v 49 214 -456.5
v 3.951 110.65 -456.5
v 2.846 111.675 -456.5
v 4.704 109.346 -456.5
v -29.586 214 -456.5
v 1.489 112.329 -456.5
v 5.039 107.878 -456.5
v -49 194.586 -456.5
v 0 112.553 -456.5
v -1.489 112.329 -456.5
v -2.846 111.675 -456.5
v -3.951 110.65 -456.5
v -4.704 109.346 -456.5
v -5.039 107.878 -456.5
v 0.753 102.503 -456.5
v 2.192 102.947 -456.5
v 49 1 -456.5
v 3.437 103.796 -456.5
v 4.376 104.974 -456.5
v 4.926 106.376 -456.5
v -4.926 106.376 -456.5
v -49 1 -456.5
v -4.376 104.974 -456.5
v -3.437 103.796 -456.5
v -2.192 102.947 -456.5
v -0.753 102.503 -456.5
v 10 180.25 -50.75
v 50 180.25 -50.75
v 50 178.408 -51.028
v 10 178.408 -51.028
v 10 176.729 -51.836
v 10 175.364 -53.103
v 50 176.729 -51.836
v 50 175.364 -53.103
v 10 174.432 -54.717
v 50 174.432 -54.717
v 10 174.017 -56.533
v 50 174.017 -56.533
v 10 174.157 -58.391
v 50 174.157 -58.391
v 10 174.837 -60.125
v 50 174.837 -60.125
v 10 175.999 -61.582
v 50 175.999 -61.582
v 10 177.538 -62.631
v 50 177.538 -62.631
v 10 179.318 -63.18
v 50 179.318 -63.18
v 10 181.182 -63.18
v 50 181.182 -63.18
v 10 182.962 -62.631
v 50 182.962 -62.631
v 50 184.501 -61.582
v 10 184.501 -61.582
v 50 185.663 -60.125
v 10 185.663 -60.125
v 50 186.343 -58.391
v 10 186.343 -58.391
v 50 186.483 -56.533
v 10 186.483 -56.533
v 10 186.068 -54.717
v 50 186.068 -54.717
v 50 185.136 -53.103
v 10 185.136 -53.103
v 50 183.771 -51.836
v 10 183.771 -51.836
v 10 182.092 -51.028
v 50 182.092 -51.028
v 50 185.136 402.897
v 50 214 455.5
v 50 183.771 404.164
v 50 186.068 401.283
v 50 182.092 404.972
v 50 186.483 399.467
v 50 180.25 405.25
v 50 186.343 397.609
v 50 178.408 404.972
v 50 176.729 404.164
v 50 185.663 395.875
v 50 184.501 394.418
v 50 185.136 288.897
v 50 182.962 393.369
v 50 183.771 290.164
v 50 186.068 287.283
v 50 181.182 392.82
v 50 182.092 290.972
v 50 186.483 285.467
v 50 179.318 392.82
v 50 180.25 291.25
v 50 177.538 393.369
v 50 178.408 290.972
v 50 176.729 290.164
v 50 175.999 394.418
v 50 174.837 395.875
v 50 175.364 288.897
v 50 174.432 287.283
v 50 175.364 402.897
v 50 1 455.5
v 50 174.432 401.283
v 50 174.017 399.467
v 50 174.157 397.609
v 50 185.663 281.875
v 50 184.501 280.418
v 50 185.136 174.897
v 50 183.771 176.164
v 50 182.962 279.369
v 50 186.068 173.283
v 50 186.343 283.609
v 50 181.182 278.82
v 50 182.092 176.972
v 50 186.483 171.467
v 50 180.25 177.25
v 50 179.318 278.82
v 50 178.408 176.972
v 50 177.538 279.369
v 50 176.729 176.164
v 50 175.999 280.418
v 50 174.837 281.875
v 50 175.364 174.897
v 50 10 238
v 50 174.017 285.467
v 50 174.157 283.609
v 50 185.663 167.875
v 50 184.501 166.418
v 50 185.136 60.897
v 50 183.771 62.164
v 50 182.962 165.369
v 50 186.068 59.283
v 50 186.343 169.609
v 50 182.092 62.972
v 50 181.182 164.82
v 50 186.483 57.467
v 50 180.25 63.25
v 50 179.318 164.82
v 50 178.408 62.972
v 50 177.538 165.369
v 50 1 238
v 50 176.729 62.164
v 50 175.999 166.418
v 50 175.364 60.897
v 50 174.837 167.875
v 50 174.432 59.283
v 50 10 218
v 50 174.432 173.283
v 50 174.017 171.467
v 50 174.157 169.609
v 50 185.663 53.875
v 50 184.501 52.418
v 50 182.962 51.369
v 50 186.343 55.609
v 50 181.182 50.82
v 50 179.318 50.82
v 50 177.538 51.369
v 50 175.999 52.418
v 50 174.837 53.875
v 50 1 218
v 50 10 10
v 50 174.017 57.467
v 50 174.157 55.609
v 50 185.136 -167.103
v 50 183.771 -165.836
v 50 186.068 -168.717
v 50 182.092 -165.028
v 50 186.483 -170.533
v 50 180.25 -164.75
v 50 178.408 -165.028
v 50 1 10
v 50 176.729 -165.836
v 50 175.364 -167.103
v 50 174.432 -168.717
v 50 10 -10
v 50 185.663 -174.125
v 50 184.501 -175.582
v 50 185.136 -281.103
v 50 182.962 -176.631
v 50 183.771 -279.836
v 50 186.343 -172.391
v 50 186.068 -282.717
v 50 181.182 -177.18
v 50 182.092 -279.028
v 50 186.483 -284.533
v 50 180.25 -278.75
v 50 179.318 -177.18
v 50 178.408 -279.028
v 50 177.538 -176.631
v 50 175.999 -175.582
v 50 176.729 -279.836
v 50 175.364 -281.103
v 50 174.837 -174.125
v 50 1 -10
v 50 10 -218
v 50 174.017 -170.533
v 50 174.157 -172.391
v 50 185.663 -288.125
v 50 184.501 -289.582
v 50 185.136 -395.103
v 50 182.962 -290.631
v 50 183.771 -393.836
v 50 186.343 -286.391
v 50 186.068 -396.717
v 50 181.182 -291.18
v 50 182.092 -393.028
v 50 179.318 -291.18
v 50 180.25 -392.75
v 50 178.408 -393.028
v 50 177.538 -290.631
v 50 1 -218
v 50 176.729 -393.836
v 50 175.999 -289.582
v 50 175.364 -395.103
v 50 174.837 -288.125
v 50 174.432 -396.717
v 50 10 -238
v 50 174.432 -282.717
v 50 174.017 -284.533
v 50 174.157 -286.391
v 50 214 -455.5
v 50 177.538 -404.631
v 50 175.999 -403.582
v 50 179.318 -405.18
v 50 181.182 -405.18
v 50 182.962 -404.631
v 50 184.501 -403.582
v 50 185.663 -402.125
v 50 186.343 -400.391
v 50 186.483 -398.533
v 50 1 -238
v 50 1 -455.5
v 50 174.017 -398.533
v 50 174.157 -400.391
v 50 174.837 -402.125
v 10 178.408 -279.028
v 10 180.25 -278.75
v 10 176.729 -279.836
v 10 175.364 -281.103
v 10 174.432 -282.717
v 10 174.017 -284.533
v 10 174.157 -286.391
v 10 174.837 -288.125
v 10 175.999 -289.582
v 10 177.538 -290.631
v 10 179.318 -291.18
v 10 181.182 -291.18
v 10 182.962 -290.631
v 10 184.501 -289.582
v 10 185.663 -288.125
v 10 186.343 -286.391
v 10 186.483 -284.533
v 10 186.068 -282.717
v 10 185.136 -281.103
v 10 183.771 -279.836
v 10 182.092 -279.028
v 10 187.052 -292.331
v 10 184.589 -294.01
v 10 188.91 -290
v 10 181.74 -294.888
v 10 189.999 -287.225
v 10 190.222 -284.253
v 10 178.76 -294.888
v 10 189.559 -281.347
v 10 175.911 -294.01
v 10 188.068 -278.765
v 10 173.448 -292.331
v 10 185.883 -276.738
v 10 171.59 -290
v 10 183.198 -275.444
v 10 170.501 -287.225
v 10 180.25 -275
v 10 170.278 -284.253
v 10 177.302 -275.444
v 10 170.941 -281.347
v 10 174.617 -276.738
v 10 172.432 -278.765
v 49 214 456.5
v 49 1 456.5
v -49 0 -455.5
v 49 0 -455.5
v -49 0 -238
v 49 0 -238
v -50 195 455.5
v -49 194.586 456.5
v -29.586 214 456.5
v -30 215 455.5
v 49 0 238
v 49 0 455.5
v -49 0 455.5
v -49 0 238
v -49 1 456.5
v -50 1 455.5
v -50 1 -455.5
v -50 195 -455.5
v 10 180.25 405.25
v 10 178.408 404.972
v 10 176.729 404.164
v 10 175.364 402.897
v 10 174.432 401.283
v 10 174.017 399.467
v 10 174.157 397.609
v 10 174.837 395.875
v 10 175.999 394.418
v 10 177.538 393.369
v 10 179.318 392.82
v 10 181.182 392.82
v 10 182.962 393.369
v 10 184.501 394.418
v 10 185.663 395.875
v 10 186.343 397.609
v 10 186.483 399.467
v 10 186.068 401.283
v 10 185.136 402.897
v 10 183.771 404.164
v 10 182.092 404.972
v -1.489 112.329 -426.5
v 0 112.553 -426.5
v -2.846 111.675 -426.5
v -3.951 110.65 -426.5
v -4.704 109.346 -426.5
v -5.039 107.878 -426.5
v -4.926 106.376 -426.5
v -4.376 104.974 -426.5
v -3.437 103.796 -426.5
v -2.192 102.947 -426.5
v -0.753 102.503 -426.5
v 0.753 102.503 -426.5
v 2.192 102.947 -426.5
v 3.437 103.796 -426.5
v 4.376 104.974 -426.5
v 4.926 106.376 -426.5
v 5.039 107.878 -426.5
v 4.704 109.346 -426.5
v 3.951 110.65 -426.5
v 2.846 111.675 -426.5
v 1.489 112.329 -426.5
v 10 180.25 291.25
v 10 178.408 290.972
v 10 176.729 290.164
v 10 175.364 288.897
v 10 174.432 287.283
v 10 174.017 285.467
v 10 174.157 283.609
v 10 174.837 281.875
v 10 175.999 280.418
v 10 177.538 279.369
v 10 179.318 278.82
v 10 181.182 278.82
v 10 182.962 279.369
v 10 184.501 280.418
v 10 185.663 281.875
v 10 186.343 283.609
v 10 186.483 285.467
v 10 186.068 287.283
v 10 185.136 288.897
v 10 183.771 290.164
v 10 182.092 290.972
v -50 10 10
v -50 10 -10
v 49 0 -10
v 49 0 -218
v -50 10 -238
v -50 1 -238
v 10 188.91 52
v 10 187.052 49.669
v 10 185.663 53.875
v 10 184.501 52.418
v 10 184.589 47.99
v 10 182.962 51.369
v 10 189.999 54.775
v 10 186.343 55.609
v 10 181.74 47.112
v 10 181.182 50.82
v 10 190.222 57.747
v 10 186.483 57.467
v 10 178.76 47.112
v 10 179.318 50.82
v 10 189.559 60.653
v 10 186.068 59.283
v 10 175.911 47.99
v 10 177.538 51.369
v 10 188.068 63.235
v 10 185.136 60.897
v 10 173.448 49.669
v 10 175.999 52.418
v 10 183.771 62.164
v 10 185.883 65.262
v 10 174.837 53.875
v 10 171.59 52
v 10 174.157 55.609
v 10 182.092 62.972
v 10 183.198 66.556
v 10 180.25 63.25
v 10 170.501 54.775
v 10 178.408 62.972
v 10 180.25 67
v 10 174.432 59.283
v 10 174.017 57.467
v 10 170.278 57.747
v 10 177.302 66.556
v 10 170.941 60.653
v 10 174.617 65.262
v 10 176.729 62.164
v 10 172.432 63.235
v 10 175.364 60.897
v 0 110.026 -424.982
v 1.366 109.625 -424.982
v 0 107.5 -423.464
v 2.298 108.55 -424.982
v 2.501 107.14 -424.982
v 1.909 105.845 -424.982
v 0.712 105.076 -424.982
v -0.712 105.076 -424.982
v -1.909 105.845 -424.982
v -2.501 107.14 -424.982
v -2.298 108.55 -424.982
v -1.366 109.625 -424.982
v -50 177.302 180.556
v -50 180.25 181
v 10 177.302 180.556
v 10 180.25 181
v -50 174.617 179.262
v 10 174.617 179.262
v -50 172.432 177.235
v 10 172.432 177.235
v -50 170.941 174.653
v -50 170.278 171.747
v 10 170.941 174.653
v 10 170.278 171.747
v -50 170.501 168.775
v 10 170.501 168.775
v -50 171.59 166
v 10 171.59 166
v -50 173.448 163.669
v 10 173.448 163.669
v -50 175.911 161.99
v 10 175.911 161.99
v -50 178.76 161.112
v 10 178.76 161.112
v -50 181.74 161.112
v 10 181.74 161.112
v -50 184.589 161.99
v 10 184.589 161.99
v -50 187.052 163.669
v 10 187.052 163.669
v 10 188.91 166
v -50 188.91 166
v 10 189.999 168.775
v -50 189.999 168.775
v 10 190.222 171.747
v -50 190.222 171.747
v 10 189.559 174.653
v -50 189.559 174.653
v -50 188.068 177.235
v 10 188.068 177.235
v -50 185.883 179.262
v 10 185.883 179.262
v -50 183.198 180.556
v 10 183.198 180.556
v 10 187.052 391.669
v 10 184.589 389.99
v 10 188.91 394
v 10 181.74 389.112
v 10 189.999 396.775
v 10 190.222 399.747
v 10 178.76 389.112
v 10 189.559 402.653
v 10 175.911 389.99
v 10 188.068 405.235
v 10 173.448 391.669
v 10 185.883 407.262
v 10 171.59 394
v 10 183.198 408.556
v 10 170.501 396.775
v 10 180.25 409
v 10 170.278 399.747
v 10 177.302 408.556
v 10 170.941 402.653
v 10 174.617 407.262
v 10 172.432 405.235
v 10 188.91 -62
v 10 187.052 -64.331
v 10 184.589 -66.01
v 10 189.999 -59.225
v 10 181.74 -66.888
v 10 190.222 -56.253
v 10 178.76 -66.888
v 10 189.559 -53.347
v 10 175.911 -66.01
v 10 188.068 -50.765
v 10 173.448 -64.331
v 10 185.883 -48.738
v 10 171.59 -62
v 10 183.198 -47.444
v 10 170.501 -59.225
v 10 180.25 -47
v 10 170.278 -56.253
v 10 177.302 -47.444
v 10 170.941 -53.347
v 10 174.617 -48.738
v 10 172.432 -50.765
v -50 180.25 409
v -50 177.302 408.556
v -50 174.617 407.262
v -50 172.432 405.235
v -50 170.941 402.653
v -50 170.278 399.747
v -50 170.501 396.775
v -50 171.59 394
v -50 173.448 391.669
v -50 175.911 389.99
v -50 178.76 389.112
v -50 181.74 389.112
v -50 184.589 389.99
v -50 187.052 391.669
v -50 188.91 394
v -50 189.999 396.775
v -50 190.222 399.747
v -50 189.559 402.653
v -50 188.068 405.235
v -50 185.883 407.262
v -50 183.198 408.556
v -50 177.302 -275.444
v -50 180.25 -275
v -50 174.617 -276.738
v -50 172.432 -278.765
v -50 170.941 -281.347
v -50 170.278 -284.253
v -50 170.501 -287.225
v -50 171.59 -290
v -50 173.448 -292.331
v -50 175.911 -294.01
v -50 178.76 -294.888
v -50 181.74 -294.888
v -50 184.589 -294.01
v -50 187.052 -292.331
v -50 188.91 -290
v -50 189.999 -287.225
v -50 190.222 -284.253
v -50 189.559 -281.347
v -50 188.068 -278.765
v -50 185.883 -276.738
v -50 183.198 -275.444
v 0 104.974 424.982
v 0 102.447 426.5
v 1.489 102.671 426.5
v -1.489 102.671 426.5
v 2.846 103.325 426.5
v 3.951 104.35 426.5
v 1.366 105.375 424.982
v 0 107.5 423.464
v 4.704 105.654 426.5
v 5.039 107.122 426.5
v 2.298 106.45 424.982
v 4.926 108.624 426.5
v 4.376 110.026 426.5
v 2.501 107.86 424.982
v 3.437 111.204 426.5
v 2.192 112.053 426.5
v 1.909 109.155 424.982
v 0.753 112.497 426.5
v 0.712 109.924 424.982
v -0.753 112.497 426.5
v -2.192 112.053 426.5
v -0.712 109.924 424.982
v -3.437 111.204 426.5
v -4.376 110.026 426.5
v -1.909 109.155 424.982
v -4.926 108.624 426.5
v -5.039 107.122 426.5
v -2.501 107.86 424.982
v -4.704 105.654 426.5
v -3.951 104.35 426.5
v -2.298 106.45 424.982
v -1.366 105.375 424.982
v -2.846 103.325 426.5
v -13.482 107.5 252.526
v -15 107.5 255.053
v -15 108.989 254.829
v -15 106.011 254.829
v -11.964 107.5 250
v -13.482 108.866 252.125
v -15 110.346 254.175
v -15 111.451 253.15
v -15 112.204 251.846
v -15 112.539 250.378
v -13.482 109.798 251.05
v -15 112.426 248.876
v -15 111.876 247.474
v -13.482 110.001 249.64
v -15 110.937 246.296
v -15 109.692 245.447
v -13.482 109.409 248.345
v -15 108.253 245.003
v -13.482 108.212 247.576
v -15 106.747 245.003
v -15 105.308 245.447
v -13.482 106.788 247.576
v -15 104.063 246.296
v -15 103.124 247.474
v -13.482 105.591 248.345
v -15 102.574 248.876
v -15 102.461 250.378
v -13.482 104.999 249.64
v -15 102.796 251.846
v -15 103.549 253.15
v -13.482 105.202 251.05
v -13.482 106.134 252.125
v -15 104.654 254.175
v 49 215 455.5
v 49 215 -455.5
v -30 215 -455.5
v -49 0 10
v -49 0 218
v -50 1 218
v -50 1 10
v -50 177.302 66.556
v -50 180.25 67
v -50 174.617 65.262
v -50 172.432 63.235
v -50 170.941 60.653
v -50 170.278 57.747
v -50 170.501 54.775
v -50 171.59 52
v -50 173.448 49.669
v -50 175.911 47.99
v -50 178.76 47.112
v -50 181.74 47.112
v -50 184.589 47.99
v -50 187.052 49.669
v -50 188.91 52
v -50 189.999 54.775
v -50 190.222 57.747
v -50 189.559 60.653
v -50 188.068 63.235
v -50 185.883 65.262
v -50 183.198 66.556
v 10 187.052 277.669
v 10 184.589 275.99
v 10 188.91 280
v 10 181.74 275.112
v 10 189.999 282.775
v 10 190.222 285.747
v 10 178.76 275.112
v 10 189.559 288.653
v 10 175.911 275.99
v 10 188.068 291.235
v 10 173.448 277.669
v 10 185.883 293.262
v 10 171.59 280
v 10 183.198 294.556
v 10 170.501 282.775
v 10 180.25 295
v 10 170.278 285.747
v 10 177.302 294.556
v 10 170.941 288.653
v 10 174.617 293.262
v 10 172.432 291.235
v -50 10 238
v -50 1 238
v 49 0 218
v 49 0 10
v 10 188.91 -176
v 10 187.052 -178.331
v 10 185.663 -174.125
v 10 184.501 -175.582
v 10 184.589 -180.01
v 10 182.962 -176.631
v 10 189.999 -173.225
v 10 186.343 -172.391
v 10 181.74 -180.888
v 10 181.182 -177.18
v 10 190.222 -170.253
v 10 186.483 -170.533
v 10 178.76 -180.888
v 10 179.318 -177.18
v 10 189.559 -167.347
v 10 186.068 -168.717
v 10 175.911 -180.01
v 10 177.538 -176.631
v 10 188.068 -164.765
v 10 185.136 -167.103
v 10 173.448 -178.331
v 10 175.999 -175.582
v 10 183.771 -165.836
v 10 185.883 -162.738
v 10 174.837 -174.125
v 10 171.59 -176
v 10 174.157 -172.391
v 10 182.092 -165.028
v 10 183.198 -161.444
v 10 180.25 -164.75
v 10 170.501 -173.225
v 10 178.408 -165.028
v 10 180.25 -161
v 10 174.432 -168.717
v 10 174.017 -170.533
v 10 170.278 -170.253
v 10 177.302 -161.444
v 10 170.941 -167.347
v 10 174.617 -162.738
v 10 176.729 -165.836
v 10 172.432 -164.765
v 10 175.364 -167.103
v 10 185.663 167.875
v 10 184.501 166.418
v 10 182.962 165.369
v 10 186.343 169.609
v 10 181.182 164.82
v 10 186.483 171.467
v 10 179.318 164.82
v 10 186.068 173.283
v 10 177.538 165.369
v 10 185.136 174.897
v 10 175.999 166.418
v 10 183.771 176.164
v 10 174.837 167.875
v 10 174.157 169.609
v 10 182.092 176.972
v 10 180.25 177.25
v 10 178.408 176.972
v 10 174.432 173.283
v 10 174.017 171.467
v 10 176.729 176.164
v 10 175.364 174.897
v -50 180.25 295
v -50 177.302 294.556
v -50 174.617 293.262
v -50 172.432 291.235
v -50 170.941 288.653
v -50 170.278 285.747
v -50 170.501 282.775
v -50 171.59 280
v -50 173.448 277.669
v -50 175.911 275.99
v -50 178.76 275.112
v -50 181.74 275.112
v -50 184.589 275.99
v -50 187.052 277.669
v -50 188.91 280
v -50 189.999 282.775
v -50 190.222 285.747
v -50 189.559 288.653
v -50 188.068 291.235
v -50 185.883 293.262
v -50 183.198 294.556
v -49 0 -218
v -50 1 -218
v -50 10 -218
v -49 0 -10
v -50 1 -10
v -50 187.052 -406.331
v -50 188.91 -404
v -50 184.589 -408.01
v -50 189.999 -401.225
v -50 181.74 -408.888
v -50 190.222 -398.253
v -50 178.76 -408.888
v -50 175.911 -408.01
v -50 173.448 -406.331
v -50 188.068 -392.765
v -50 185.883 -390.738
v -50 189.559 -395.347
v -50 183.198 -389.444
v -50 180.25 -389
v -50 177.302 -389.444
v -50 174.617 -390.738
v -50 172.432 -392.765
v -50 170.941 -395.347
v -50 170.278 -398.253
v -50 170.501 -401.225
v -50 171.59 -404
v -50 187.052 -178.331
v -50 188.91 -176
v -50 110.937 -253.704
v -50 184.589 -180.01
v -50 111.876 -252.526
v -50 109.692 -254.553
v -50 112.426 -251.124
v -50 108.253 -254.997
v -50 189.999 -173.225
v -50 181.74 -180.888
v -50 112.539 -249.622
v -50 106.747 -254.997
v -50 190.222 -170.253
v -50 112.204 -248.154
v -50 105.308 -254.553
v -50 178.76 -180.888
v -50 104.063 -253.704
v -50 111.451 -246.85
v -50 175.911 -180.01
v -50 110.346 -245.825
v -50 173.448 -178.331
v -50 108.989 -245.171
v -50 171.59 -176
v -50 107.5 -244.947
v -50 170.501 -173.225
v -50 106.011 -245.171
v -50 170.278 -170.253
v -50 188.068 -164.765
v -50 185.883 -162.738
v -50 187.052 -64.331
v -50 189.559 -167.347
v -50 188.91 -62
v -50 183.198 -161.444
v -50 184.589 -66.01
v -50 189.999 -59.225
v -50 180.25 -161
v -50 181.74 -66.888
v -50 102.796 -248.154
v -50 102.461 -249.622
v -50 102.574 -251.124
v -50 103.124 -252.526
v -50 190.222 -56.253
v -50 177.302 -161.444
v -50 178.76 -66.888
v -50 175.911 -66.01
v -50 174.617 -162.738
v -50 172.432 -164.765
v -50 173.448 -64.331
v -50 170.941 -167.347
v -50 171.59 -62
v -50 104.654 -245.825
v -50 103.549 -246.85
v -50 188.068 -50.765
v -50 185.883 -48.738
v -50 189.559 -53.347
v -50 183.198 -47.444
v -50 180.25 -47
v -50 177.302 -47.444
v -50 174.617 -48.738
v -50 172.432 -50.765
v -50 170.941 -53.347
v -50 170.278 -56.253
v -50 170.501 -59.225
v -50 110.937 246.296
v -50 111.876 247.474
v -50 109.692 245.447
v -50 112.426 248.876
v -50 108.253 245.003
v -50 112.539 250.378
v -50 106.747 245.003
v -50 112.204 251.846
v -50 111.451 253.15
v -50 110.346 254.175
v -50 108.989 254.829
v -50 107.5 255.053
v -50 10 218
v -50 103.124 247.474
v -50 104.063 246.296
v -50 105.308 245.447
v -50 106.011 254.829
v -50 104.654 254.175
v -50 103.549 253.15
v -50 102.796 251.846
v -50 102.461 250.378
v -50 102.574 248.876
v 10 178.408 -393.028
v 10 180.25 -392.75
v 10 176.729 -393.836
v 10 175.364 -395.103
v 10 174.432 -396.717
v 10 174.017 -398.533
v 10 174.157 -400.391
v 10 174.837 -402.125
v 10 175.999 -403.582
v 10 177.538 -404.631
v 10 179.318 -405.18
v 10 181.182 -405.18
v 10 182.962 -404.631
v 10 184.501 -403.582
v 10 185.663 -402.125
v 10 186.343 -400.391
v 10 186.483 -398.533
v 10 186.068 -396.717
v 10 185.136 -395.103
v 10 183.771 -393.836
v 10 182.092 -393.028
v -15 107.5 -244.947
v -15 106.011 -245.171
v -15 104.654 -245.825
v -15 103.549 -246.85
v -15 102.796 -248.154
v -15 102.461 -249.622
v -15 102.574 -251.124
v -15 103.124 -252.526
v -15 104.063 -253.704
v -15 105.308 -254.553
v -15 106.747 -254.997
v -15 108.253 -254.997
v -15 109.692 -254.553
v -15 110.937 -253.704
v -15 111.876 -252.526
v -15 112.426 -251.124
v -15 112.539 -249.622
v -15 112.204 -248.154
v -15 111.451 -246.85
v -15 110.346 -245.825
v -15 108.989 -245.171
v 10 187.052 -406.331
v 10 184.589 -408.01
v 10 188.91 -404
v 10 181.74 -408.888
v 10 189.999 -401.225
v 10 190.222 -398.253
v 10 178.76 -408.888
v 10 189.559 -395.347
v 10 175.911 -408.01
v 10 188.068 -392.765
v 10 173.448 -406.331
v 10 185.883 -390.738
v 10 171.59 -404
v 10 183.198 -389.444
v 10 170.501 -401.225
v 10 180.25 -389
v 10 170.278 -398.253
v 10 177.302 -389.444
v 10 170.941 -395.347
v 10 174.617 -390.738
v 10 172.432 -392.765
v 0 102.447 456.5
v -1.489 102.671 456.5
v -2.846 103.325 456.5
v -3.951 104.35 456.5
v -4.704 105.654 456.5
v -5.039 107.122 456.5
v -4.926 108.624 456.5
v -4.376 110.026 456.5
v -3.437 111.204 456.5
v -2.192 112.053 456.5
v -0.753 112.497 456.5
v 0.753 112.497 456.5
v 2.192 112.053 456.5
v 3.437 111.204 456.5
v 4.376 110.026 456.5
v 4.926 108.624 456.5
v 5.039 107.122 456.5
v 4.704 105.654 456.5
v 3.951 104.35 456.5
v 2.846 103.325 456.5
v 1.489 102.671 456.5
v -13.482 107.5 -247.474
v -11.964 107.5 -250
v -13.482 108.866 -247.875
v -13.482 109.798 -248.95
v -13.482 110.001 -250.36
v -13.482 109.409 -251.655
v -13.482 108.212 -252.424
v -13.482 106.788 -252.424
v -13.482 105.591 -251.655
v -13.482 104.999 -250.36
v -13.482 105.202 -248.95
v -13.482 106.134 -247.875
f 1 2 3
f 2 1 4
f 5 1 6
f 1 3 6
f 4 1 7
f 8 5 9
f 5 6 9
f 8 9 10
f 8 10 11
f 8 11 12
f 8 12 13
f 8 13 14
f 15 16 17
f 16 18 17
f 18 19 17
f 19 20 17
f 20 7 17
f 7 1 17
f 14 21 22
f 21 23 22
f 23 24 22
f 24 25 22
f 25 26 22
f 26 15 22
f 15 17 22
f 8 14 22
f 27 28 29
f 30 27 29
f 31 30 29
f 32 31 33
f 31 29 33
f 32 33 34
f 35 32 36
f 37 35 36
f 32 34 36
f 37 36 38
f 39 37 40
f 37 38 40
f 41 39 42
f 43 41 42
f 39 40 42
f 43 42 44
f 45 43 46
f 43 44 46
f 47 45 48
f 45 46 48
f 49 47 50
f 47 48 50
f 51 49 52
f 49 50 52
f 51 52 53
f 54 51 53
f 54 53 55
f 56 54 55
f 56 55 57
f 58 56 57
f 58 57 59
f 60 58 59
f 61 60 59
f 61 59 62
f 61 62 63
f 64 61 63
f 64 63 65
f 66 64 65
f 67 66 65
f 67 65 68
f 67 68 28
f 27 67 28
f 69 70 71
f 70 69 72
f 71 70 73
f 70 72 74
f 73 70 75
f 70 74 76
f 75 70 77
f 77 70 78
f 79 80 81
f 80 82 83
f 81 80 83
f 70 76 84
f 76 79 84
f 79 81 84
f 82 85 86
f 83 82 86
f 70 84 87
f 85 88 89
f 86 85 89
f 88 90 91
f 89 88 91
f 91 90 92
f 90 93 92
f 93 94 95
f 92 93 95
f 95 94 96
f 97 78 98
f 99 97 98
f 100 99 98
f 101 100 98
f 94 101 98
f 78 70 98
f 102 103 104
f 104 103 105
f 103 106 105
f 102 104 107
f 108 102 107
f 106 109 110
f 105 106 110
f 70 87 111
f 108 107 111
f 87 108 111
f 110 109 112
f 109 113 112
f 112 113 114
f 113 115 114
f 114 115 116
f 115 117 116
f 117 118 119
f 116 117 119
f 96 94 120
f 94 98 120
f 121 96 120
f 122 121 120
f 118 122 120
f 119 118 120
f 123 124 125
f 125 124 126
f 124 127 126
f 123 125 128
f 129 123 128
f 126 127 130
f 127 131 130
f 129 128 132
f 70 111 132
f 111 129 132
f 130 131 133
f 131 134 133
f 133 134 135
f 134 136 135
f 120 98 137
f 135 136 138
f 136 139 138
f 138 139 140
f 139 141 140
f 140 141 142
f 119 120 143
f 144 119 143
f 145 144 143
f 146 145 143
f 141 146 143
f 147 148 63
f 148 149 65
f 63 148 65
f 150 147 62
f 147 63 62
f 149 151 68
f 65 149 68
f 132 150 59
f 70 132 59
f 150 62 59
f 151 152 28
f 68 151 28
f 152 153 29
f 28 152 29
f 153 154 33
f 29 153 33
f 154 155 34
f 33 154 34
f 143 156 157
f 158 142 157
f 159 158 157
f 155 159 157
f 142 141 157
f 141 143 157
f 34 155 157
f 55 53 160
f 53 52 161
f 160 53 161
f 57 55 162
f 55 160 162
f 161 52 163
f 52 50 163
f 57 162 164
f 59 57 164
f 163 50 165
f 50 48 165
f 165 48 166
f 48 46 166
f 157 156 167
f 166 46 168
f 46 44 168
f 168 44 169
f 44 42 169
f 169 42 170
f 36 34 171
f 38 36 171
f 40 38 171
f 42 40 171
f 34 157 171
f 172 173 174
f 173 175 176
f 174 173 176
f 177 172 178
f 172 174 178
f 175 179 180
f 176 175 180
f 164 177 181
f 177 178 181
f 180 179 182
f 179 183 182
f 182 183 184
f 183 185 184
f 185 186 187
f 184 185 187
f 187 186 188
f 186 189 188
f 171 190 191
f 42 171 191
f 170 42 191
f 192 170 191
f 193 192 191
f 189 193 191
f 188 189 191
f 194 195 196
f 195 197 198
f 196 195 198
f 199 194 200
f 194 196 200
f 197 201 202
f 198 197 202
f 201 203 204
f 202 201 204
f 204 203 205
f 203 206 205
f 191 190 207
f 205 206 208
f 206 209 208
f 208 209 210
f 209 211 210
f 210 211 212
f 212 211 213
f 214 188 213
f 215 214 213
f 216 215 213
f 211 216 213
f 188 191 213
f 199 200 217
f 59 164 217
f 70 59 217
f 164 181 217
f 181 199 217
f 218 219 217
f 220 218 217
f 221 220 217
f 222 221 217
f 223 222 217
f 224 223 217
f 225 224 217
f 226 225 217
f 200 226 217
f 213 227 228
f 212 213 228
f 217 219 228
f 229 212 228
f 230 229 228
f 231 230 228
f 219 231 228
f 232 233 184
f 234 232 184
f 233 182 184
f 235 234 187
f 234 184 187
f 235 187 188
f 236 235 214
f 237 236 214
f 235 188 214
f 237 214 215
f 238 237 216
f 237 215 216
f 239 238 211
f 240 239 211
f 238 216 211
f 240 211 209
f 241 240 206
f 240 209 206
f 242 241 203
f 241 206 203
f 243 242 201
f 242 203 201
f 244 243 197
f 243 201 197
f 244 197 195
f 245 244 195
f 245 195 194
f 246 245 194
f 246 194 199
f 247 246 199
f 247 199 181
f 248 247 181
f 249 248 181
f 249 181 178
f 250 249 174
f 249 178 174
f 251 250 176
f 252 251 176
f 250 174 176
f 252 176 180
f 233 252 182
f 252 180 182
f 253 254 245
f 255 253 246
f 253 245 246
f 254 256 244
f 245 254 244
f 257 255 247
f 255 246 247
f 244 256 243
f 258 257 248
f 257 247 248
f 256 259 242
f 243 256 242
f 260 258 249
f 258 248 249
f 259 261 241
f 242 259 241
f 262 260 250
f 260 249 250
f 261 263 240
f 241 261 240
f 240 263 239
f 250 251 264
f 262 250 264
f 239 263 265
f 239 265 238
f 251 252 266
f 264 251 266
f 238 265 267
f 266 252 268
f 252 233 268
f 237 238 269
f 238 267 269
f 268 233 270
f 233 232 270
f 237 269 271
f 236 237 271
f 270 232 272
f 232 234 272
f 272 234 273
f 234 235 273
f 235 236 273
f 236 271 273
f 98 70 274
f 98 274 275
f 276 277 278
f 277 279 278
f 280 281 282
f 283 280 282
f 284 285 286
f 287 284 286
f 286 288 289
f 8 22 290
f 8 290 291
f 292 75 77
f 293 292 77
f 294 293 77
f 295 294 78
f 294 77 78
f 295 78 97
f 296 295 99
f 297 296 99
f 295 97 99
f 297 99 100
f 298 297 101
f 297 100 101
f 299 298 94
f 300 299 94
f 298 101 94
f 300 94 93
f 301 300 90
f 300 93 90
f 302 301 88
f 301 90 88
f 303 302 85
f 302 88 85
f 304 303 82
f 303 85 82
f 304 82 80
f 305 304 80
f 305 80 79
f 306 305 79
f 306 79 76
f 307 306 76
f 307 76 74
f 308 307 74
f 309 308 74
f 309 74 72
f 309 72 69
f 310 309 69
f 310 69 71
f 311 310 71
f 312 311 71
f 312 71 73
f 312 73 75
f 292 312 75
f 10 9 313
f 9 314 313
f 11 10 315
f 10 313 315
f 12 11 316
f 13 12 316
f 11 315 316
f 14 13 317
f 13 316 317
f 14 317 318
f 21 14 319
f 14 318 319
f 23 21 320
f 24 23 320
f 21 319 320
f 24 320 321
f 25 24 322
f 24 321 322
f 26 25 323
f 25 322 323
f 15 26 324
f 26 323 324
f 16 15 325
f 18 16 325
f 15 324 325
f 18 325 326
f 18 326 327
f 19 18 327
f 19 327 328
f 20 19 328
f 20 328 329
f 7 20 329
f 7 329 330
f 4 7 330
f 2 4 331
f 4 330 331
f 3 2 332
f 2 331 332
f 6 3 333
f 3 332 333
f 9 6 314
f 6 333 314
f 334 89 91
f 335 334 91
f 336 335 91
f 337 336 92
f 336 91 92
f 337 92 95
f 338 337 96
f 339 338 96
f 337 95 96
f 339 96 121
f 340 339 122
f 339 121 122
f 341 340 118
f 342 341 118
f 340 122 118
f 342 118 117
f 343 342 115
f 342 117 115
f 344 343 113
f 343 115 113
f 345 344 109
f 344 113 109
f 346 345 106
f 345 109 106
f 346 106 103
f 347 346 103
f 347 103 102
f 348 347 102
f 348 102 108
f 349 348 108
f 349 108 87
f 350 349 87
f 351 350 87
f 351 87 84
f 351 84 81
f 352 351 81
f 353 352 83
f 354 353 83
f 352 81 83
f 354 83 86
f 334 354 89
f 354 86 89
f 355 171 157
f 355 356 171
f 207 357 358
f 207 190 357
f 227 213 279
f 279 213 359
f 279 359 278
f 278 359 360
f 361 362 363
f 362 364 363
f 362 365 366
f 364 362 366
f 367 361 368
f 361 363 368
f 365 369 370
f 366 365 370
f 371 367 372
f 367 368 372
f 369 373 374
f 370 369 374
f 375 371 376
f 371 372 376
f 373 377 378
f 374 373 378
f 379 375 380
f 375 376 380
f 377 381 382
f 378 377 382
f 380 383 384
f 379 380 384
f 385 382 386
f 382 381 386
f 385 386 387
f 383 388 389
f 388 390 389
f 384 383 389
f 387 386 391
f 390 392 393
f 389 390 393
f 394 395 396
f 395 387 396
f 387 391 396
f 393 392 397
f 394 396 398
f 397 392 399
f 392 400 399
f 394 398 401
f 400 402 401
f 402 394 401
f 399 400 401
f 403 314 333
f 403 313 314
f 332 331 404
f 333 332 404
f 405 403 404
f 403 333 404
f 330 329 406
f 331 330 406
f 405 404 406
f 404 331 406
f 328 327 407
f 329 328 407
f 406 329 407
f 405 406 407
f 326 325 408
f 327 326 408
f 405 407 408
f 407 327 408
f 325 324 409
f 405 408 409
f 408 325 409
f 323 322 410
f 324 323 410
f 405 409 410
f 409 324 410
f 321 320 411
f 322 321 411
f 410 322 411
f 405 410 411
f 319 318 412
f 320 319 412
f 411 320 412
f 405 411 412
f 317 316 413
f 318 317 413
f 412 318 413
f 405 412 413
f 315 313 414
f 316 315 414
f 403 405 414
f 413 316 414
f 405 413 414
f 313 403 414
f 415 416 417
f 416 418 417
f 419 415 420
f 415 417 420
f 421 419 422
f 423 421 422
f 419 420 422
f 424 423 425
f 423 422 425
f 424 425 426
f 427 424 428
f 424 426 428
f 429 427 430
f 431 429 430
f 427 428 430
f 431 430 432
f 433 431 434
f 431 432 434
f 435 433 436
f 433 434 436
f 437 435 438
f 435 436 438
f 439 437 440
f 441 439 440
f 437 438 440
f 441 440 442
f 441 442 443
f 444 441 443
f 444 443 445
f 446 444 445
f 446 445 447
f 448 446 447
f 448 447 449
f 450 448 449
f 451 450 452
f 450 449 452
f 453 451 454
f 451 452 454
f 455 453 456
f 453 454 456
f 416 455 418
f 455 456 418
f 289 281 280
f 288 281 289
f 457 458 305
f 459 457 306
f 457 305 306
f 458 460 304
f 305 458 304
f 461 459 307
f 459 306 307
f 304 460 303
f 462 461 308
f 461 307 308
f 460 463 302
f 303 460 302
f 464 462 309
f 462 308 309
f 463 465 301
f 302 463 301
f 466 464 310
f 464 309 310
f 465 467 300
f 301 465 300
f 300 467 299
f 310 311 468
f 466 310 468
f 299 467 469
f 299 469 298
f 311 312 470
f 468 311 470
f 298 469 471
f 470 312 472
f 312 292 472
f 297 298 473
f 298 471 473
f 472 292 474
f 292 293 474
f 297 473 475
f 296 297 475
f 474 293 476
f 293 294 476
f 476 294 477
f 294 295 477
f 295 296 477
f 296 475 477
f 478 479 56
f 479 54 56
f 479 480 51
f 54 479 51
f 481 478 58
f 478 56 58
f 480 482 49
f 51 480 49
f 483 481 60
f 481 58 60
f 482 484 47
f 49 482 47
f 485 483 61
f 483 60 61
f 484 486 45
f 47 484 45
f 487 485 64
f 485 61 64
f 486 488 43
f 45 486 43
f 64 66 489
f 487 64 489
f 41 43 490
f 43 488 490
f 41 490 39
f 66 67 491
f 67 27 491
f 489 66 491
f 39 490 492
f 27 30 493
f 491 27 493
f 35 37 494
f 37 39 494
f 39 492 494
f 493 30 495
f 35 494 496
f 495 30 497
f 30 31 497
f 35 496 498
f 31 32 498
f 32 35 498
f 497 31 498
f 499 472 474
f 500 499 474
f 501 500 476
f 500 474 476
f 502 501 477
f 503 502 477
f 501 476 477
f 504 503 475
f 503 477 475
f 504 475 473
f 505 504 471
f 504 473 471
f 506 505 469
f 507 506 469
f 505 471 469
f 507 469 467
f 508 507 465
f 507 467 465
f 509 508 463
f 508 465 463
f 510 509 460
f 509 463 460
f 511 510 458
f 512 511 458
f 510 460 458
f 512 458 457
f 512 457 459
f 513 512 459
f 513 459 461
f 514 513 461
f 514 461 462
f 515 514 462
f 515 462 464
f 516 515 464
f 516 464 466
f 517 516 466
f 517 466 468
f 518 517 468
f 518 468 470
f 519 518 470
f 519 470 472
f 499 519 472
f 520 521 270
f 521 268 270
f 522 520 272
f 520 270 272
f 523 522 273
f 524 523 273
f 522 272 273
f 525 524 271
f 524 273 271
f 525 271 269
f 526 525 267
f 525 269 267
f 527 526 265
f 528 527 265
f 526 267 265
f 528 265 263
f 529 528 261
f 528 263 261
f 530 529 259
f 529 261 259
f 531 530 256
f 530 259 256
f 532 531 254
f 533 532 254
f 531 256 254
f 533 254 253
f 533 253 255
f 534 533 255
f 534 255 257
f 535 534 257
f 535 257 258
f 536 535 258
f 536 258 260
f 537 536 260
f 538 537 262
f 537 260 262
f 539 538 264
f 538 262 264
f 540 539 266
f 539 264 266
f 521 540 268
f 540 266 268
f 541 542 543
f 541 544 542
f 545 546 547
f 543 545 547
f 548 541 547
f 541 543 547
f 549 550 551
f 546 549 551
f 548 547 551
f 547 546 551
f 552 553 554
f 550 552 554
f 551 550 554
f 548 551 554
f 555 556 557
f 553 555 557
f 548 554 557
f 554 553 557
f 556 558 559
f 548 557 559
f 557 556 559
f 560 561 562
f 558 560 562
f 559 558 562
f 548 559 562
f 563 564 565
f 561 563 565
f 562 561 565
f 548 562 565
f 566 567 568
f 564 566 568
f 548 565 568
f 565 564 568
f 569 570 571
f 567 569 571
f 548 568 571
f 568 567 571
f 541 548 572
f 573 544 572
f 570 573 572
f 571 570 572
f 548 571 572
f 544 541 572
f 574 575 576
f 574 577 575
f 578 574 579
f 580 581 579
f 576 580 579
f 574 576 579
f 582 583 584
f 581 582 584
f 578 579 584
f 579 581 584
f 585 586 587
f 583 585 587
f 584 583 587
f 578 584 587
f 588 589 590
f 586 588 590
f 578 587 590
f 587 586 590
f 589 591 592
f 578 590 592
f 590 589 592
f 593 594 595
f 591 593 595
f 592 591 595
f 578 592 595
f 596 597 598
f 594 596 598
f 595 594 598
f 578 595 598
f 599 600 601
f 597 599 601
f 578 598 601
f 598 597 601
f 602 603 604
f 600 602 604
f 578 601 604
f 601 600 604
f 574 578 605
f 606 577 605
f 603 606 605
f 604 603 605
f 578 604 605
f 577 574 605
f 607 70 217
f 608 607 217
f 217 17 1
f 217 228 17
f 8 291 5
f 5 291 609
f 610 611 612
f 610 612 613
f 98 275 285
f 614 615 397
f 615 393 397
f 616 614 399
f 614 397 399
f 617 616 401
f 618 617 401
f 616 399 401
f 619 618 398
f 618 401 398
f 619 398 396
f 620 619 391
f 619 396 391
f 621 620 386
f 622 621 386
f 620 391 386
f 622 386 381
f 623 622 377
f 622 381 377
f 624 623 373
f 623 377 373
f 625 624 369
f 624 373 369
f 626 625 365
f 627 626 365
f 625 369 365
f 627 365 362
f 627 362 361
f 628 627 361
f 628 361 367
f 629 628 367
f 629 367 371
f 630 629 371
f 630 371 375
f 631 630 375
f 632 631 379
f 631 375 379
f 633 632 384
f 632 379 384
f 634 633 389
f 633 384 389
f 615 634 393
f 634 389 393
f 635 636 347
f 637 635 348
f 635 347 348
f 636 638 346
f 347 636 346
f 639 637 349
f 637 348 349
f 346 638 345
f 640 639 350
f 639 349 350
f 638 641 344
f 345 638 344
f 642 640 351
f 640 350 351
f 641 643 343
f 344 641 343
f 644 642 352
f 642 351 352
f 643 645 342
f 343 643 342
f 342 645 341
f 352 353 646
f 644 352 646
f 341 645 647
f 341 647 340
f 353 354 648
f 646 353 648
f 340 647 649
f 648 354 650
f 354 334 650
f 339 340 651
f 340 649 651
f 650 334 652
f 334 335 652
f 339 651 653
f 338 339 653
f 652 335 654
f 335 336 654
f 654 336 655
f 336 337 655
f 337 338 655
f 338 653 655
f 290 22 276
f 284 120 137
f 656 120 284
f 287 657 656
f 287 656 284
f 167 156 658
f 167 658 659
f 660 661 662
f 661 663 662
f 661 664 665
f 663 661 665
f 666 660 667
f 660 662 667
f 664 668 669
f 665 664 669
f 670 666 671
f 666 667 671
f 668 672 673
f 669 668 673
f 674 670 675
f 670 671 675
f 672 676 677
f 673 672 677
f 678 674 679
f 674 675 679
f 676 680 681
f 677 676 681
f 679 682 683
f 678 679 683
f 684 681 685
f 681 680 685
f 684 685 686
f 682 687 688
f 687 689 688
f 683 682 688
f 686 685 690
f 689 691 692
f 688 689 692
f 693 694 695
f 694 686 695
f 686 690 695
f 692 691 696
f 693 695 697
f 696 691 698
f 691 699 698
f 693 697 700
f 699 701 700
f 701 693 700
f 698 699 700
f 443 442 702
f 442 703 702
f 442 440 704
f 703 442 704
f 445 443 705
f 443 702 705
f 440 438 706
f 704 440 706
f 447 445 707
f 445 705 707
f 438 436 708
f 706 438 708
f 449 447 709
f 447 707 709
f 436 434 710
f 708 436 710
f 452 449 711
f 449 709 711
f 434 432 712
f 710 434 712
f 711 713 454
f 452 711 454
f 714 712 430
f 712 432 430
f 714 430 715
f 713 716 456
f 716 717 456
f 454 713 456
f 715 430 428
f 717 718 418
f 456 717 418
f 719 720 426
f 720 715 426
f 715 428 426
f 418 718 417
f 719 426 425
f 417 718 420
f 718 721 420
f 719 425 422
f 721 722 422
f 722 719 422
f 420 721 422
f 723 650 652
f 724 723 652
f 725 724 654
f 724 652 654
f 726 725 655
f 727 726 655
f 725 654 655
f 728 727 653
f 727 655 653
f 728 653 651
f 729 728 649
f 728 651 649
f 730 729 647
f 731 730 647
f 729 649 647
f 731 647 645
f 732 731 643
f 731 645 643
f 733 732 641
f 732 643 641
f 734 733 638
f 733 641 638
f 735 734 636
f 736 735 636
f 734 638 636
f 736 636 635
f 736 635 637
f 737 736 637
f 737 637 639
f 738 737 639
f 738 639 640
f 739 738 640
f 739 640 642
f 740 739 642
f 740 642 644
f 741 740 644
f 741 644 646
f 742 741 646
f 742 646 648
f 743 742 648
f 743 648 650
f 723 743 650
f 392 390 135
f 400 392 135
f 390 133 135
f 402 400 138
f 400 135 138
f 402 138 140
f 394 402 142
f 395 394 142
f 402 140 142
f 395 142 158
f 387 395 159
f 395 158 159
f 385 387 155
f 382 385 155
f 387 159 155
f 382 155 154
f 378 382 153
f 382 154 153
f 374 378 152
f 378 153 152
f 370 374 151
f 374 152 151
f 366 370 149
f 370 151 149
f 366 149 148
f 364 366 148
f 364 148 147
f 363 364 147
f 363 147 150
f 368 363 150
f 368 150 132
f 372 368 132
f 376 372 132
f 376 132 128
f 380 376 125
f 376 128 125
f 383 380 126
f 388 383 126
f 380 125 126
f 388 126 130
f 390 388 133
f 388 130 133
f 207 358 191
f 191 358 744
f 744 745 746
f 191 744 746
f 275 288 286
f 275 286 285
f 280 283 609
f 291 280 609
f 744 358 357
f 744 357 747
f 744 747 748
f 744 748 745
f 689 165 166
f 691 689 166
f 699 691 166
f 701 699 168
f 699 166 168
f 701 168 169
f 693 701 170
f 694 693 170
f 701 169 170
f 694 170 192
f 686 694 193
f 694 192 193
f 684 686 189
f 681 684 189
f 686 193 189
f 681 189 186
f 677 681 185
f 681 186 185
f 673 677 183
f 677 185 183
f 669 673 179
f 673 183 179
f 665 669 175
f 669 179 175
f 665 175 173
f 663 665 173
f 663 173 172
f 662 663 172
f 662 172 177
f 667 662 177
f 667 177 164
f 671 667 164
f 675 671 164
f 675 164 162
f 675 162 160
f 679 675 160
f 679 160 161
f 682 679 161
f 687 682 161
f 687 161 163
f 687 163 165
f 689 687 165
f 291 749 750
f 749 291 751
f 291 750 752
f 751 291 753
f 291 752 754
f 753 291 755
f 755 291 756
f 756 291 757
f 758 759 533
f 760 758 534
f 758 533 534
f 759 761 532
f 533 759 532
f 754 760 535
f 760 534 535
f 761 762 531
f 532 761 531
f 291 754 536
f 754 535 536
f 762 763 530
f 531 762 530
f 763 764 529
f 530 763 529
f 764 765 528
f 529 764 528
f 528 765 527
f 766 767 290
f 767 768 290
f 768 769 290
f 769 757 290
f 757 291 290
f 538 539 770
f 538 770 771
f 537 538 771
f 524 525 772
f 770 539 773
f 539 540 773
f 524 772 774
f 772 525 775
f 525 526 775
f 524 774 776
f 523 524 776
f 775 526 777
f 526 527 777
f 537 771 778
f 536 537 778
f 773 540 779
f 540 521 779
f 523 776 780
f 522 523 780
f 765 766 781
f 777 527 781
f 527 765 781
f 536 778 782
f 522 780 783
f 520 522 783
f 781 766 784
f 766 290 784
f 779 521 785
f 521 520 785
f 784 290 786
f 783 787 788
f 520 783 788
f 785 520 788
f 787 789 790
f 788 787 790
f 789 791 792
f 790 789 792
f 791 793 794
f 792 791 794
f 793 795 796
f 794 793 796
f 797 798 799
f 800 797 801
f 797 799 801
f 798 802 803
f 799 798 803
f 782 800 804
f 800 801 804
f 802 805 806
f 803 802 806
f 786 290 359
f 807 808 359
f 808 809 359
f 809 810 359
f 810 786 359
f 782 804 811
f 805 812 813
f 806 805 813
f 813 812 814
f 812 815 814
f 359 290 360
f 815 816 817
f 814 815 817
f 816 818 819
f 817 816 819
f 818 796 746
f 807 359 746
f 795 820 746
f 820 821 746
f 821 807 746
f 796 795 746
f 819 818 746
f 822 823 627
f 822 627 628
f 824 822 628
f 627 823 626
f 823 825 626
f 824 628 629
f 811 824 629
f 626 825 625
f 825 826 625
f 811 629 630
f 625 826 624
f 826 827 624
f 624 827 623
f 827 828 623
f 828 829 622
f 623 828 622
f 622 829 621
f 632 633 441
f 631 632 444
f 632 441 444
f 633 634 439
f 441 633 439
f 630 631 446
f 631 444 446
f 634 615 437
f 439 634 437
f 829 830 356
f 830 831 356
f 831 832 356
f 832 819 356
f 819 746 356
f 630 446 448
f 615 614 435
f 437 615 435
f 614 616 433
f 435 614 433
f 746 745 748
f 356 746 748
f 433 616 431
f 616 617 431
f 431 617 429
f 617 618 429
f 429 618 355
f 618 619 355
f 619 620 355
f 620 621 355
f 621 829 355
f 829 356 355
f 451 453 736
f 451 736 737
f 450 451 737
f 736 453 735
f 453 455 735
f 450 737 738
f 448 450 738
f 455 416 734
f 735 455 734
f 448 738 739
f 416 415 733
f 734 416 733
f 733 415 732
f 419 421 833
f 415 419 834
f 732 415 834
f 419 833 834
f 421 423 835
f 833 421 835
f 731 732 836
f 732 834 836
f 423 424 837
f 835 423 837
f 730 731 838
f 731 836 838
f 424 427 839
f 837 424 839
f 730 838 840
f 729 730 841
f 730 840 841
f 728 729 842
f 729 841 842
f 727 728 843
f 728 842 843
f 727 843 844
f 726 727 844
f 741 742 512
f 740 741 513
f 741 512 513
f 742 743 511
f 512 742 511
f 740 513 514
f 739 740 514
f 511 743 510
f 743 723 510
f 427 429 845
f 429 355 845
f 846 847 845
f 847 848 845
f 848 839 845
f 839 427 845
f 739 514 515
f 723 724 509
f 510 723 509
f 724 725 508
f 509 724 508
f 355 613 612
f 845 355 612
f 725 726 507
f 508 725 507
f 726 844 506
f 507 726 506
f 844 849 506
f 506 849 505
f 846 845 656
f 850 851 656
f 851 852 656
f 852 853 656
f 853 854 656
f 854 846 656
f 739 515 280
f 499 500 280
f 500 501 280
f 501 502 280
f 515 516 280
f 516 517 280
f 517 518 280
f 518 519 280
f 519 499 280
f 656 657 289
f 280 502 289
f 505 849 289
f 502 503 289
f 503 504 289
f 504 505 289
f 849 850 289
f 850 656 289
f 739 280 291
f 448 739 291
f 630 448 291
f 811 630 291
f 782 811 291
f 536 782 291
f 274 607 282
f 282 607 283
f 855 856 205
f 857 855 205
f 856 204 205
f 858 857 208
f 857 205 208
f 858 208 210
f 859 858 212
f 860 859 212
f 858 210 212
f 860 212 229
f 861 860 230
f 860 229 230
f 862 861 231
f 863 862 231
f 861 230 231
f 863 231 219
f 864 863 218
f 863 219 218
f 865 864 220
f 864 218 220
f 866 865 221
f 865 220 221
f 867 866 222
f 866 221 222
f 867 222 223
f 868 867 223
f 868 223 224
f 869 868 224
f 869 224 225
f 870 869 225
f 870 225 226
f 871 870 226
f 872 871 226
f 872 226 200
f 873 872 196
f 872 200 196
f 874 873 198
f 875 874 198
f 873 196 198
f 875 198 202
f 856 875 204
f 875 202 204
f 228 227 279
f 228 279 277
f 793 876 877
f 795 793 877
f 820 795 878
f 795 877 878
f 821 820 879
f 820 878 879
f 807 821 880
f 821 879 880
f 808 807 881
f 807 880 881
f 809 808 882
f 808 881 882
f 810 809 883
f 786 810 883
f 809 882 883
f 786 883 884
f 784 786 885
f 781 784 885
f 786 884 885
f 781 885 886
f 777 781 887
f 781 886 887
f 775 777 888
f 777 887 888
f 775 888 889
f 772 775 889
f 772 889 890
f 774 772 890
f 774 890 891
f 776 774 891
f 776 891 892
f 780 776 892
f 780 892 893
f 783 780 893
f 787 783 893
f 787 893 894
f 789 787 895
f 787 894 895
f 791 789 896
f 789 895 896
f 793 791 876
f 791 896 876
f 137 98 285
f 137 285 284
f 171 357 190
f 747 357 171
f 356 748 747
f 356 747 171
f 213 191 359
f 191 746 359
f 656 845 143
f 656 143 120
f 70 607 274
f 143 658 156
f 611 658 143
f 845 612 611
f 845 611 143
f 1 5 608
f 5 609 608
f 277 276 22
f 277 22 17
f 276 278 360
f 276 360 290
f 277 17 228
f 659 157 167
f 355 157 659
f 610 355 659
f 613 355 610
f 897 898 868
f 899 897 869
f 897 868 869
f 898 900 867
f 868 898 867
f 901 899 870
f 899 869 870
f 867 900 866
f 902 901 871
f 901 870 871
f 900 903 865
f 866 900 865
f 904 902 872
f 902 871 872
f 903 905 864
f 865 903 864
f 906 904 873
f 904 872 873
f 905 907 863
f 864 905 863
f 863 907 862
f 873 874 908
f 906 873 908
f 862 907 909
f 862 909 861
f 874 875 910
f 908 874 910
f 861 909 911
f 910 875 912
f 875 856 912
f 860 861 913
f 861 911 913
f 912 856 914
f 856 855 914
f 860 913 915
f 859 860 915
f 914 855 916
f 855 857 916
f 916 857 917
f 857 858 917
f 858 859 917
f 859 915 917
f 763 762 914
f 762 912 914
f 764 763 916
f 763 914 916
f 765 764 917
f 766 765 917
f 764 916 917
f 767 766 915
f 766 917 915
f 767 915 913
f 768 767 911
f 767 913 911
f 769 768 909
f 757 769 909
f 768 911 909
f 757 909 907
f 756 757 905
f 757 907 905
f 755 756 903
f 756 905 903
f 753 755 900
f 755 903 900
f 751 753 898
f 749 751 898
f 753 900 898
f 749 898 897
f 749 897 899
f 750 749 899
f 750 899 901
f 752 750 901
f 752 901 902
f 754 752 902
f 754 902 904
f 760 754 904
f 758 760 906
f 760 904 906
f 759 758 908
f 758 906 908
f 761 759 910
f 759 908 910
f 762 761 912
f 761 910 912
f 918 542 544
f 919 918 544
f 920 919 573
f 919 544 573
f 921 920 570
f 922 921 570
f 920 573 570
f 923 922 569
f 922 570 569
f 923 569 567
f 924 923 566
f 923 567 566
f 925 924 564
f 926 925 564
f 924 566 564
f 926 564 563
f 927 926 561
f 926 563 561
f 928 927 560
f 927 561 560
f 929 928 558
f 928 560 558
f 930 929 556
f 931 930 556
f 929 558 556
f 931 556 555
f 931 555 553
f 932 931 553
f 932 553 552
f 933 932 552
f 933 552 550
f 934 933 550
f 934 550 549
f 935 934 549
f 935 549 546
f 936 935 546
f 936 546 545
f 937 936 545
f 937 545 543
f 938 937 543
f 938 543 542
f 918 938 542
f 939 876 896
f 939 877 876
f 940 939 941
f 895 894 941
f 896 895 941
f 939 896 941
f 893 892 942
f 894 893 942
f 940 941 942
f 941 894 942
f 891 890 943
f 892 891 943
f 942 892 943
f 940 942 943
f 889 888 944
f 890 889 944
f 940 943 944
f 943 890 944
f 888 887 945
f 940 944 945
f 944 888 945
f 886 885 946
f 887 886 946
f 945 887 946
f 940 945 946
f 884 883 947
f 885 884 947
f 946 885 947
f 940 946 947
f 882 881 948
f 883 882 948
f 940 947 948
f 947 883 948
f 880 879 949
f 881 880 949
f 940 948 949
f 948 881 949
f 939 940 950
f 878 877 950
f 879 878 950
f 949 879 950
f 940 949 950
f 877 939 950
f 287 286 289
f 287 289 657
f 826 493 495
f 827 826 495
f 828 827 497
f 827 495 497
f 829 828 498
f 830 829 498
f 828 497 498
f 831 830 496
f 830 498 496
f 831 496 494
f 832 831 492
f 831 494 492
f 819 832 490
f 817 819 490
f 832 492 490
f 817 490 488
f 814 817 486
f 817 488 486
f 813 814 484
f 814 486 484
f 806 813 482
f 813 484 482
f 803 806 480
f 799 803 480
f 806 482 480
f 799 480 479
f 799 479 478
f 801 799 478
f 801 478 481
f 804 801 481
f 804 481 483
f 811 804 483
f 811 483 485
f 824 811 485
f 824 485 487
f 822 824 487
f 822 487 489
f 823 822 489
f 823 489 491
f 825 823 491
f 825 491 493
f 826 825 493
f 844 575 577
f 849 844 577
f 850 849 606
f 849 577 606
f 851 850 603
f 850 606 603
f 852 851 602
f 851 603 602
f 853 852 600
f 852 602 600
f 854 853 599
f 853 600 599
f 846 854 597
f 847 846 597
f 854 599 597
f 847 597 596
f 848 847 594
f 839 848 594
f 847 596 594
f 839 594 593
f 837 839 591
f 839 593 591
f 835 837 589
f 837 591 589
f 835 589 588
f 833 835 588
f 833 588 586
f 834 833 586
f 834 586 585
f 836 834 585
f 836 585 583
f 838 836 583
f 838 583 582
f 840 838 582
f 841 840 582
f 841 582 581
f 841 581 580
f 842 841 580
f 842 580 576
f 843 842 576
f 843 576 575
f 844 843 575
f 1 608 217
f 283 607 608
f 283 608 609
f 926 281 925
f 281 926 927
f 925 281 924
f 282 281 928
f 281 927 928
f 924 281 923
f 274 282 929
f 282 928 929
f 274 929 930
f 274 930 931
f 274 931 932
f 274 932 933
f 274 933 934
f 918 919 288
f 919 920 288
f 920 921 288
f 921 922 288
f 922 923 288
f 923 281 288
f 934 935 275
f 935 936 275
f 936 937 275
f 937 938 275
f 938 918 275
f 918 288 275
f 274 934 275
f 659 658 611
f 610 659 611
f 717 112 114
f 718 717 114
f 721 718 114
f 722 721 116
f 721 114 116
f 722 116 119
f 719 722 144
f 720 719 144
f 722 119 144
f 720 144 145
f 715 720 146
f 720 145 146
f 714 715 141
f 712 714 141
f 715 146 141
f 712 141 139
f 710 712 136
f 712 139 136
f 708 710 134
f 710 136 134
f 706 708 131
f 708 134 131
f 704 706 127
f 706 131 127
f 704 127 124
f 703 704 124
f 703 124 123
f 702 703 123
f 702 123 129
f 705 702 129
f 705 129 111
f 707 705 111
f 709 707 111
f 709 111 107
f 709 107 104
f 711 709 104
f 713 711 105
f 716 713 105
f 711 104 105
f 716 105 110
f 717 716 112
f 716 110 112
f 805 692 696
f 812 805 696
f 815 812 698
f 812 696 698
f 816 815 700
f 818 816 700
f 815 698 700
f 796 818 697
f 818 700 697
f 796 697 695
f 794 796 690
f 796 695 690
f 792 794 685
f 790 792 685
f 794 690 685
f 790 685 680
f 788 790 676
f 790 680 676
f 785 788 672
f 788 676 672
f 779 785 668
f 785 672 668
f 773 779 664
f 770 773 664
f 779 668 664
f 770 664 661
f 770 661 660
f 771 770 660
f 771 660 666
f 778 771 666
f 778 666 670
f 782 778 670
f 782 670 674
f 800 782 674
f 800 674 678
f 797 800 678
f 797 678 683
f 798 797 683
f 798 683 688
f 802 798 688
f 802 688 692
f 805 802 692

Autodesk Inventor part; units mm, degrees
ref_plane "YZ Plane" through (0, 0, 0) normal (1, 0, 0) x (0, 1, 0)
ref_plane "XZ Plane" through (0, 0, 0) normal (0, 1, 0) x (-1, 0, 0)
ref_plane "XY Plane" through (0, 0, 0) normal (0, 0, 1) x (1, 0, 0)
sketch "Sketch5" plane through (0, 0, 0) normal (0, 1, 0) x (-1, 0, 0)
  line L0 (50, 456.5) -> (-50, 456.5)
  line L1 (-50, 456.5) -> (-50, -456.5)
  line L2 (-50, -456.5) -> (50, -456.5)
  line L3 (50, -456.5) -> (50, 456.5)
  point P0 (0, 0)
  point P1 (50, 0)
  point P2 (0, 456.5)
  dimension "d8" = 100
  dimension "d9" = 913
extrude "Extrusion5" add sketch "Sketch5" along normal blind 215
sketch "Sketch7" plane through (-50, 0, -456.5) normal (-1, 0, 0) x (0, 0, 1)
  line L0 (0, 215) -> (913, 215) projected
  circle A0 centre (855.5, 180.25) radius 5.8396
  circle A1 centre (741.5, 180.25) radius 5.8396
  circle A2 centre (627.5, 180.25) radius 5.8396
  circle A3 centre (513.5, 180.25) radius 5.8396
  line L1 (456.5, 215) -> (456.5, 169.0746) construction
  circle A4 centre (57.5, 180.25) radius 5.8396
  circle A5 centre (171.5, 180.25) radius 5.8396
  circle A6 centre (285.5, 180.25) radius 5.8396
  circle A7 centre (399.5, 180.25) radius 5.8396
  line L2 (913, 0) -> (913, 215) projected
  point P0 (456.5, 0)
  point P1 (456.5, 0)
  dimension "d21" = 114
  dimension "d22" = 114
  dimension "d23" = 114
  dimension "d24" = 57
  dimension "d25" = 34.75
  dimension "d37" = 57.5
hole "Hole1" at (-50, 180.25, 399) at (-50, 180.25, 285) at (-50, 180.25, 171) at (-50, 180.25, 57) at (-50, 180.25, -57) at (-50, 180.25, -171) at (-50, 180.25, -285) at (-50, 180.25, -399) direction (1, 0, 0) diameter 12.5 end through all counterbore diameter 20 counterbore depth 60 clearance for "Socket Head Cap Screw DIN EN ISO 4762" size "M12" standard "DIN"
chamfer "Chamfer3" distance 20 angle 45 1 edges at (-50, 215, 0)
sketch "Sketch9" plane through (-50, 0, 456.5) normal (0, 0, 1) x (1, 0, 0)
  line L0 (0, 0) -> (100, 0) projected
  line L1 (100, 0) -> (100, 215) projected
  circle A0 centre (50, 107.5) radius 6
  point P0 (50, 0)
  point P1 (50, 0)
  point P2 (100, 107.5)
  dimension "d38" = 12
hole "Hole2" at (0, 107.5, 456.5) direction (0, 0, -1) diameter 10.106 depth 30 tip angle 118 thread size "M12x1.75" class "6H" standard "ANSI Metric M Profile"
sketch "Sketch10" plane through (50, 0, -456.5) normal (0, 0, -1) x (-1, 0, 0)
  line L0 (0, 0) -> (0, 215) projected
  line L1 (0, 0) -> (100, 0) projected
  circle A0 centre (50, 107.5) radius 6
  point P0 (50, 0)
  point P1 (0, 107.5)
  point P2 (50, 0)
  dimension "d46" = 12
hole "Hole3" at (0, 107.5, -456.5) direction (0, 0, 1) diameter 10.106 depth 30 tip angle 118 thread size "M12x1.75" class "6H" standard "ANSI Metric M Profile"
chamfer "Chamfer4" distance 1 angle 45 13 edges at (50, 215, 0) (10, 215, -456.5) (50, 107.5, -456.5) (-50, 97.5, -456.5) (0, 0, -456.5) (10, 215, 456.5) (-40, 205, 456.5) (-50, 97.5, 456.5) (50, 107.5, 456.5) (0, 0, 456.5) (50, 0, 0) (-50, 0, 0) (-40, 205, -456.5)
sketch "Sketch11" plane through (-50, 1, 455.5) normal (-1, 0, 0) x (0, 0, 1)
  line L0 (-217.5, -1) -> (-237.5, -1)
  line L1 (-237.5, -1) -> (-237.5, 9)
  line L2 (-237.5, 9) -> (-217.5, 9)
  line L3 (-217.5, 9) -> (-217.5, -1)
  line L4 (-445.5, -1) -> (-465.5, -1)
  line L5 (-465.5, -1) -> (-465.5, 9)
  line L6 (-465.5, 9) -> (-445.5, 9)
  line L7 (-445.5, 9) -> (-445.5, -1)
  line L8 (-911, -1) -> (0, -1) projected
  line L9 (-227.5, 9) -> (-227.5, 5.4206) construction
  line L10 (-455.5, -1) -> (-455.5, -35.8599) construction
  line L11 (-693.5, -1) -> (-673.5, -1)
  line L12 (-673.5, -1) -> (-673.5, 9)
  line L13 (-673.5, 9) -> (-693.5, 9)
  line L14 (-693.5, 9) -> (-693.5, -1)
  line L15 (-683.5, 9) -> (-683.5, 5.4206) construction
  point P0 (-455.5, 9)
  dimension "d57" = 20
  dimension "d58" = 10
  dimension "d59" = 10
  dimension "d60" = 20
  dimension "d61" = 228
extrude "Extrusion7" cut sketch "Sketch11" against normal through all
sketch "Sketch12" plane through (-50, 1, 455.5) normal (-1, 0, 0) x (0, 0, 1)
  circle A0 centre (-205.5, 106.5) radius 6
  circle A1 centre (-705.5, 106.5) radius 6
  line L0 (0, 214) -> (-911, 214) projected
  line L1 (-217.5, -1) -> (0, -1) projected
  point P0 (-455.5, -1)
  dimension "d64" = 215
  dimension "d65" = 107.5
  dimension "d66" = 500
  dimension "d67" = 911
  dimension "d68" = 250
  dimension "d69" = 12
hole "Hole4" at (-50, 107.5, 250) at (-50, 107.5, -250) direction (1, 0, 0) diameter 10.106 depth 35 tip angle 118 thread size "M12x1.75" class "6H" standard "ANSI Metric M Profile"
equation "\"d22\" = d21"
equation "\"d23\" = d21"
equation "\"d24\" = 0.5 * d21"
equation "\"d60\" = d57"
equation "\"d65\" = 0.5 * d64"
equation "\"d68\" = 0.5 * d66"
properties part number "BC-10006" material "Aço Carbono AISI 1006"
